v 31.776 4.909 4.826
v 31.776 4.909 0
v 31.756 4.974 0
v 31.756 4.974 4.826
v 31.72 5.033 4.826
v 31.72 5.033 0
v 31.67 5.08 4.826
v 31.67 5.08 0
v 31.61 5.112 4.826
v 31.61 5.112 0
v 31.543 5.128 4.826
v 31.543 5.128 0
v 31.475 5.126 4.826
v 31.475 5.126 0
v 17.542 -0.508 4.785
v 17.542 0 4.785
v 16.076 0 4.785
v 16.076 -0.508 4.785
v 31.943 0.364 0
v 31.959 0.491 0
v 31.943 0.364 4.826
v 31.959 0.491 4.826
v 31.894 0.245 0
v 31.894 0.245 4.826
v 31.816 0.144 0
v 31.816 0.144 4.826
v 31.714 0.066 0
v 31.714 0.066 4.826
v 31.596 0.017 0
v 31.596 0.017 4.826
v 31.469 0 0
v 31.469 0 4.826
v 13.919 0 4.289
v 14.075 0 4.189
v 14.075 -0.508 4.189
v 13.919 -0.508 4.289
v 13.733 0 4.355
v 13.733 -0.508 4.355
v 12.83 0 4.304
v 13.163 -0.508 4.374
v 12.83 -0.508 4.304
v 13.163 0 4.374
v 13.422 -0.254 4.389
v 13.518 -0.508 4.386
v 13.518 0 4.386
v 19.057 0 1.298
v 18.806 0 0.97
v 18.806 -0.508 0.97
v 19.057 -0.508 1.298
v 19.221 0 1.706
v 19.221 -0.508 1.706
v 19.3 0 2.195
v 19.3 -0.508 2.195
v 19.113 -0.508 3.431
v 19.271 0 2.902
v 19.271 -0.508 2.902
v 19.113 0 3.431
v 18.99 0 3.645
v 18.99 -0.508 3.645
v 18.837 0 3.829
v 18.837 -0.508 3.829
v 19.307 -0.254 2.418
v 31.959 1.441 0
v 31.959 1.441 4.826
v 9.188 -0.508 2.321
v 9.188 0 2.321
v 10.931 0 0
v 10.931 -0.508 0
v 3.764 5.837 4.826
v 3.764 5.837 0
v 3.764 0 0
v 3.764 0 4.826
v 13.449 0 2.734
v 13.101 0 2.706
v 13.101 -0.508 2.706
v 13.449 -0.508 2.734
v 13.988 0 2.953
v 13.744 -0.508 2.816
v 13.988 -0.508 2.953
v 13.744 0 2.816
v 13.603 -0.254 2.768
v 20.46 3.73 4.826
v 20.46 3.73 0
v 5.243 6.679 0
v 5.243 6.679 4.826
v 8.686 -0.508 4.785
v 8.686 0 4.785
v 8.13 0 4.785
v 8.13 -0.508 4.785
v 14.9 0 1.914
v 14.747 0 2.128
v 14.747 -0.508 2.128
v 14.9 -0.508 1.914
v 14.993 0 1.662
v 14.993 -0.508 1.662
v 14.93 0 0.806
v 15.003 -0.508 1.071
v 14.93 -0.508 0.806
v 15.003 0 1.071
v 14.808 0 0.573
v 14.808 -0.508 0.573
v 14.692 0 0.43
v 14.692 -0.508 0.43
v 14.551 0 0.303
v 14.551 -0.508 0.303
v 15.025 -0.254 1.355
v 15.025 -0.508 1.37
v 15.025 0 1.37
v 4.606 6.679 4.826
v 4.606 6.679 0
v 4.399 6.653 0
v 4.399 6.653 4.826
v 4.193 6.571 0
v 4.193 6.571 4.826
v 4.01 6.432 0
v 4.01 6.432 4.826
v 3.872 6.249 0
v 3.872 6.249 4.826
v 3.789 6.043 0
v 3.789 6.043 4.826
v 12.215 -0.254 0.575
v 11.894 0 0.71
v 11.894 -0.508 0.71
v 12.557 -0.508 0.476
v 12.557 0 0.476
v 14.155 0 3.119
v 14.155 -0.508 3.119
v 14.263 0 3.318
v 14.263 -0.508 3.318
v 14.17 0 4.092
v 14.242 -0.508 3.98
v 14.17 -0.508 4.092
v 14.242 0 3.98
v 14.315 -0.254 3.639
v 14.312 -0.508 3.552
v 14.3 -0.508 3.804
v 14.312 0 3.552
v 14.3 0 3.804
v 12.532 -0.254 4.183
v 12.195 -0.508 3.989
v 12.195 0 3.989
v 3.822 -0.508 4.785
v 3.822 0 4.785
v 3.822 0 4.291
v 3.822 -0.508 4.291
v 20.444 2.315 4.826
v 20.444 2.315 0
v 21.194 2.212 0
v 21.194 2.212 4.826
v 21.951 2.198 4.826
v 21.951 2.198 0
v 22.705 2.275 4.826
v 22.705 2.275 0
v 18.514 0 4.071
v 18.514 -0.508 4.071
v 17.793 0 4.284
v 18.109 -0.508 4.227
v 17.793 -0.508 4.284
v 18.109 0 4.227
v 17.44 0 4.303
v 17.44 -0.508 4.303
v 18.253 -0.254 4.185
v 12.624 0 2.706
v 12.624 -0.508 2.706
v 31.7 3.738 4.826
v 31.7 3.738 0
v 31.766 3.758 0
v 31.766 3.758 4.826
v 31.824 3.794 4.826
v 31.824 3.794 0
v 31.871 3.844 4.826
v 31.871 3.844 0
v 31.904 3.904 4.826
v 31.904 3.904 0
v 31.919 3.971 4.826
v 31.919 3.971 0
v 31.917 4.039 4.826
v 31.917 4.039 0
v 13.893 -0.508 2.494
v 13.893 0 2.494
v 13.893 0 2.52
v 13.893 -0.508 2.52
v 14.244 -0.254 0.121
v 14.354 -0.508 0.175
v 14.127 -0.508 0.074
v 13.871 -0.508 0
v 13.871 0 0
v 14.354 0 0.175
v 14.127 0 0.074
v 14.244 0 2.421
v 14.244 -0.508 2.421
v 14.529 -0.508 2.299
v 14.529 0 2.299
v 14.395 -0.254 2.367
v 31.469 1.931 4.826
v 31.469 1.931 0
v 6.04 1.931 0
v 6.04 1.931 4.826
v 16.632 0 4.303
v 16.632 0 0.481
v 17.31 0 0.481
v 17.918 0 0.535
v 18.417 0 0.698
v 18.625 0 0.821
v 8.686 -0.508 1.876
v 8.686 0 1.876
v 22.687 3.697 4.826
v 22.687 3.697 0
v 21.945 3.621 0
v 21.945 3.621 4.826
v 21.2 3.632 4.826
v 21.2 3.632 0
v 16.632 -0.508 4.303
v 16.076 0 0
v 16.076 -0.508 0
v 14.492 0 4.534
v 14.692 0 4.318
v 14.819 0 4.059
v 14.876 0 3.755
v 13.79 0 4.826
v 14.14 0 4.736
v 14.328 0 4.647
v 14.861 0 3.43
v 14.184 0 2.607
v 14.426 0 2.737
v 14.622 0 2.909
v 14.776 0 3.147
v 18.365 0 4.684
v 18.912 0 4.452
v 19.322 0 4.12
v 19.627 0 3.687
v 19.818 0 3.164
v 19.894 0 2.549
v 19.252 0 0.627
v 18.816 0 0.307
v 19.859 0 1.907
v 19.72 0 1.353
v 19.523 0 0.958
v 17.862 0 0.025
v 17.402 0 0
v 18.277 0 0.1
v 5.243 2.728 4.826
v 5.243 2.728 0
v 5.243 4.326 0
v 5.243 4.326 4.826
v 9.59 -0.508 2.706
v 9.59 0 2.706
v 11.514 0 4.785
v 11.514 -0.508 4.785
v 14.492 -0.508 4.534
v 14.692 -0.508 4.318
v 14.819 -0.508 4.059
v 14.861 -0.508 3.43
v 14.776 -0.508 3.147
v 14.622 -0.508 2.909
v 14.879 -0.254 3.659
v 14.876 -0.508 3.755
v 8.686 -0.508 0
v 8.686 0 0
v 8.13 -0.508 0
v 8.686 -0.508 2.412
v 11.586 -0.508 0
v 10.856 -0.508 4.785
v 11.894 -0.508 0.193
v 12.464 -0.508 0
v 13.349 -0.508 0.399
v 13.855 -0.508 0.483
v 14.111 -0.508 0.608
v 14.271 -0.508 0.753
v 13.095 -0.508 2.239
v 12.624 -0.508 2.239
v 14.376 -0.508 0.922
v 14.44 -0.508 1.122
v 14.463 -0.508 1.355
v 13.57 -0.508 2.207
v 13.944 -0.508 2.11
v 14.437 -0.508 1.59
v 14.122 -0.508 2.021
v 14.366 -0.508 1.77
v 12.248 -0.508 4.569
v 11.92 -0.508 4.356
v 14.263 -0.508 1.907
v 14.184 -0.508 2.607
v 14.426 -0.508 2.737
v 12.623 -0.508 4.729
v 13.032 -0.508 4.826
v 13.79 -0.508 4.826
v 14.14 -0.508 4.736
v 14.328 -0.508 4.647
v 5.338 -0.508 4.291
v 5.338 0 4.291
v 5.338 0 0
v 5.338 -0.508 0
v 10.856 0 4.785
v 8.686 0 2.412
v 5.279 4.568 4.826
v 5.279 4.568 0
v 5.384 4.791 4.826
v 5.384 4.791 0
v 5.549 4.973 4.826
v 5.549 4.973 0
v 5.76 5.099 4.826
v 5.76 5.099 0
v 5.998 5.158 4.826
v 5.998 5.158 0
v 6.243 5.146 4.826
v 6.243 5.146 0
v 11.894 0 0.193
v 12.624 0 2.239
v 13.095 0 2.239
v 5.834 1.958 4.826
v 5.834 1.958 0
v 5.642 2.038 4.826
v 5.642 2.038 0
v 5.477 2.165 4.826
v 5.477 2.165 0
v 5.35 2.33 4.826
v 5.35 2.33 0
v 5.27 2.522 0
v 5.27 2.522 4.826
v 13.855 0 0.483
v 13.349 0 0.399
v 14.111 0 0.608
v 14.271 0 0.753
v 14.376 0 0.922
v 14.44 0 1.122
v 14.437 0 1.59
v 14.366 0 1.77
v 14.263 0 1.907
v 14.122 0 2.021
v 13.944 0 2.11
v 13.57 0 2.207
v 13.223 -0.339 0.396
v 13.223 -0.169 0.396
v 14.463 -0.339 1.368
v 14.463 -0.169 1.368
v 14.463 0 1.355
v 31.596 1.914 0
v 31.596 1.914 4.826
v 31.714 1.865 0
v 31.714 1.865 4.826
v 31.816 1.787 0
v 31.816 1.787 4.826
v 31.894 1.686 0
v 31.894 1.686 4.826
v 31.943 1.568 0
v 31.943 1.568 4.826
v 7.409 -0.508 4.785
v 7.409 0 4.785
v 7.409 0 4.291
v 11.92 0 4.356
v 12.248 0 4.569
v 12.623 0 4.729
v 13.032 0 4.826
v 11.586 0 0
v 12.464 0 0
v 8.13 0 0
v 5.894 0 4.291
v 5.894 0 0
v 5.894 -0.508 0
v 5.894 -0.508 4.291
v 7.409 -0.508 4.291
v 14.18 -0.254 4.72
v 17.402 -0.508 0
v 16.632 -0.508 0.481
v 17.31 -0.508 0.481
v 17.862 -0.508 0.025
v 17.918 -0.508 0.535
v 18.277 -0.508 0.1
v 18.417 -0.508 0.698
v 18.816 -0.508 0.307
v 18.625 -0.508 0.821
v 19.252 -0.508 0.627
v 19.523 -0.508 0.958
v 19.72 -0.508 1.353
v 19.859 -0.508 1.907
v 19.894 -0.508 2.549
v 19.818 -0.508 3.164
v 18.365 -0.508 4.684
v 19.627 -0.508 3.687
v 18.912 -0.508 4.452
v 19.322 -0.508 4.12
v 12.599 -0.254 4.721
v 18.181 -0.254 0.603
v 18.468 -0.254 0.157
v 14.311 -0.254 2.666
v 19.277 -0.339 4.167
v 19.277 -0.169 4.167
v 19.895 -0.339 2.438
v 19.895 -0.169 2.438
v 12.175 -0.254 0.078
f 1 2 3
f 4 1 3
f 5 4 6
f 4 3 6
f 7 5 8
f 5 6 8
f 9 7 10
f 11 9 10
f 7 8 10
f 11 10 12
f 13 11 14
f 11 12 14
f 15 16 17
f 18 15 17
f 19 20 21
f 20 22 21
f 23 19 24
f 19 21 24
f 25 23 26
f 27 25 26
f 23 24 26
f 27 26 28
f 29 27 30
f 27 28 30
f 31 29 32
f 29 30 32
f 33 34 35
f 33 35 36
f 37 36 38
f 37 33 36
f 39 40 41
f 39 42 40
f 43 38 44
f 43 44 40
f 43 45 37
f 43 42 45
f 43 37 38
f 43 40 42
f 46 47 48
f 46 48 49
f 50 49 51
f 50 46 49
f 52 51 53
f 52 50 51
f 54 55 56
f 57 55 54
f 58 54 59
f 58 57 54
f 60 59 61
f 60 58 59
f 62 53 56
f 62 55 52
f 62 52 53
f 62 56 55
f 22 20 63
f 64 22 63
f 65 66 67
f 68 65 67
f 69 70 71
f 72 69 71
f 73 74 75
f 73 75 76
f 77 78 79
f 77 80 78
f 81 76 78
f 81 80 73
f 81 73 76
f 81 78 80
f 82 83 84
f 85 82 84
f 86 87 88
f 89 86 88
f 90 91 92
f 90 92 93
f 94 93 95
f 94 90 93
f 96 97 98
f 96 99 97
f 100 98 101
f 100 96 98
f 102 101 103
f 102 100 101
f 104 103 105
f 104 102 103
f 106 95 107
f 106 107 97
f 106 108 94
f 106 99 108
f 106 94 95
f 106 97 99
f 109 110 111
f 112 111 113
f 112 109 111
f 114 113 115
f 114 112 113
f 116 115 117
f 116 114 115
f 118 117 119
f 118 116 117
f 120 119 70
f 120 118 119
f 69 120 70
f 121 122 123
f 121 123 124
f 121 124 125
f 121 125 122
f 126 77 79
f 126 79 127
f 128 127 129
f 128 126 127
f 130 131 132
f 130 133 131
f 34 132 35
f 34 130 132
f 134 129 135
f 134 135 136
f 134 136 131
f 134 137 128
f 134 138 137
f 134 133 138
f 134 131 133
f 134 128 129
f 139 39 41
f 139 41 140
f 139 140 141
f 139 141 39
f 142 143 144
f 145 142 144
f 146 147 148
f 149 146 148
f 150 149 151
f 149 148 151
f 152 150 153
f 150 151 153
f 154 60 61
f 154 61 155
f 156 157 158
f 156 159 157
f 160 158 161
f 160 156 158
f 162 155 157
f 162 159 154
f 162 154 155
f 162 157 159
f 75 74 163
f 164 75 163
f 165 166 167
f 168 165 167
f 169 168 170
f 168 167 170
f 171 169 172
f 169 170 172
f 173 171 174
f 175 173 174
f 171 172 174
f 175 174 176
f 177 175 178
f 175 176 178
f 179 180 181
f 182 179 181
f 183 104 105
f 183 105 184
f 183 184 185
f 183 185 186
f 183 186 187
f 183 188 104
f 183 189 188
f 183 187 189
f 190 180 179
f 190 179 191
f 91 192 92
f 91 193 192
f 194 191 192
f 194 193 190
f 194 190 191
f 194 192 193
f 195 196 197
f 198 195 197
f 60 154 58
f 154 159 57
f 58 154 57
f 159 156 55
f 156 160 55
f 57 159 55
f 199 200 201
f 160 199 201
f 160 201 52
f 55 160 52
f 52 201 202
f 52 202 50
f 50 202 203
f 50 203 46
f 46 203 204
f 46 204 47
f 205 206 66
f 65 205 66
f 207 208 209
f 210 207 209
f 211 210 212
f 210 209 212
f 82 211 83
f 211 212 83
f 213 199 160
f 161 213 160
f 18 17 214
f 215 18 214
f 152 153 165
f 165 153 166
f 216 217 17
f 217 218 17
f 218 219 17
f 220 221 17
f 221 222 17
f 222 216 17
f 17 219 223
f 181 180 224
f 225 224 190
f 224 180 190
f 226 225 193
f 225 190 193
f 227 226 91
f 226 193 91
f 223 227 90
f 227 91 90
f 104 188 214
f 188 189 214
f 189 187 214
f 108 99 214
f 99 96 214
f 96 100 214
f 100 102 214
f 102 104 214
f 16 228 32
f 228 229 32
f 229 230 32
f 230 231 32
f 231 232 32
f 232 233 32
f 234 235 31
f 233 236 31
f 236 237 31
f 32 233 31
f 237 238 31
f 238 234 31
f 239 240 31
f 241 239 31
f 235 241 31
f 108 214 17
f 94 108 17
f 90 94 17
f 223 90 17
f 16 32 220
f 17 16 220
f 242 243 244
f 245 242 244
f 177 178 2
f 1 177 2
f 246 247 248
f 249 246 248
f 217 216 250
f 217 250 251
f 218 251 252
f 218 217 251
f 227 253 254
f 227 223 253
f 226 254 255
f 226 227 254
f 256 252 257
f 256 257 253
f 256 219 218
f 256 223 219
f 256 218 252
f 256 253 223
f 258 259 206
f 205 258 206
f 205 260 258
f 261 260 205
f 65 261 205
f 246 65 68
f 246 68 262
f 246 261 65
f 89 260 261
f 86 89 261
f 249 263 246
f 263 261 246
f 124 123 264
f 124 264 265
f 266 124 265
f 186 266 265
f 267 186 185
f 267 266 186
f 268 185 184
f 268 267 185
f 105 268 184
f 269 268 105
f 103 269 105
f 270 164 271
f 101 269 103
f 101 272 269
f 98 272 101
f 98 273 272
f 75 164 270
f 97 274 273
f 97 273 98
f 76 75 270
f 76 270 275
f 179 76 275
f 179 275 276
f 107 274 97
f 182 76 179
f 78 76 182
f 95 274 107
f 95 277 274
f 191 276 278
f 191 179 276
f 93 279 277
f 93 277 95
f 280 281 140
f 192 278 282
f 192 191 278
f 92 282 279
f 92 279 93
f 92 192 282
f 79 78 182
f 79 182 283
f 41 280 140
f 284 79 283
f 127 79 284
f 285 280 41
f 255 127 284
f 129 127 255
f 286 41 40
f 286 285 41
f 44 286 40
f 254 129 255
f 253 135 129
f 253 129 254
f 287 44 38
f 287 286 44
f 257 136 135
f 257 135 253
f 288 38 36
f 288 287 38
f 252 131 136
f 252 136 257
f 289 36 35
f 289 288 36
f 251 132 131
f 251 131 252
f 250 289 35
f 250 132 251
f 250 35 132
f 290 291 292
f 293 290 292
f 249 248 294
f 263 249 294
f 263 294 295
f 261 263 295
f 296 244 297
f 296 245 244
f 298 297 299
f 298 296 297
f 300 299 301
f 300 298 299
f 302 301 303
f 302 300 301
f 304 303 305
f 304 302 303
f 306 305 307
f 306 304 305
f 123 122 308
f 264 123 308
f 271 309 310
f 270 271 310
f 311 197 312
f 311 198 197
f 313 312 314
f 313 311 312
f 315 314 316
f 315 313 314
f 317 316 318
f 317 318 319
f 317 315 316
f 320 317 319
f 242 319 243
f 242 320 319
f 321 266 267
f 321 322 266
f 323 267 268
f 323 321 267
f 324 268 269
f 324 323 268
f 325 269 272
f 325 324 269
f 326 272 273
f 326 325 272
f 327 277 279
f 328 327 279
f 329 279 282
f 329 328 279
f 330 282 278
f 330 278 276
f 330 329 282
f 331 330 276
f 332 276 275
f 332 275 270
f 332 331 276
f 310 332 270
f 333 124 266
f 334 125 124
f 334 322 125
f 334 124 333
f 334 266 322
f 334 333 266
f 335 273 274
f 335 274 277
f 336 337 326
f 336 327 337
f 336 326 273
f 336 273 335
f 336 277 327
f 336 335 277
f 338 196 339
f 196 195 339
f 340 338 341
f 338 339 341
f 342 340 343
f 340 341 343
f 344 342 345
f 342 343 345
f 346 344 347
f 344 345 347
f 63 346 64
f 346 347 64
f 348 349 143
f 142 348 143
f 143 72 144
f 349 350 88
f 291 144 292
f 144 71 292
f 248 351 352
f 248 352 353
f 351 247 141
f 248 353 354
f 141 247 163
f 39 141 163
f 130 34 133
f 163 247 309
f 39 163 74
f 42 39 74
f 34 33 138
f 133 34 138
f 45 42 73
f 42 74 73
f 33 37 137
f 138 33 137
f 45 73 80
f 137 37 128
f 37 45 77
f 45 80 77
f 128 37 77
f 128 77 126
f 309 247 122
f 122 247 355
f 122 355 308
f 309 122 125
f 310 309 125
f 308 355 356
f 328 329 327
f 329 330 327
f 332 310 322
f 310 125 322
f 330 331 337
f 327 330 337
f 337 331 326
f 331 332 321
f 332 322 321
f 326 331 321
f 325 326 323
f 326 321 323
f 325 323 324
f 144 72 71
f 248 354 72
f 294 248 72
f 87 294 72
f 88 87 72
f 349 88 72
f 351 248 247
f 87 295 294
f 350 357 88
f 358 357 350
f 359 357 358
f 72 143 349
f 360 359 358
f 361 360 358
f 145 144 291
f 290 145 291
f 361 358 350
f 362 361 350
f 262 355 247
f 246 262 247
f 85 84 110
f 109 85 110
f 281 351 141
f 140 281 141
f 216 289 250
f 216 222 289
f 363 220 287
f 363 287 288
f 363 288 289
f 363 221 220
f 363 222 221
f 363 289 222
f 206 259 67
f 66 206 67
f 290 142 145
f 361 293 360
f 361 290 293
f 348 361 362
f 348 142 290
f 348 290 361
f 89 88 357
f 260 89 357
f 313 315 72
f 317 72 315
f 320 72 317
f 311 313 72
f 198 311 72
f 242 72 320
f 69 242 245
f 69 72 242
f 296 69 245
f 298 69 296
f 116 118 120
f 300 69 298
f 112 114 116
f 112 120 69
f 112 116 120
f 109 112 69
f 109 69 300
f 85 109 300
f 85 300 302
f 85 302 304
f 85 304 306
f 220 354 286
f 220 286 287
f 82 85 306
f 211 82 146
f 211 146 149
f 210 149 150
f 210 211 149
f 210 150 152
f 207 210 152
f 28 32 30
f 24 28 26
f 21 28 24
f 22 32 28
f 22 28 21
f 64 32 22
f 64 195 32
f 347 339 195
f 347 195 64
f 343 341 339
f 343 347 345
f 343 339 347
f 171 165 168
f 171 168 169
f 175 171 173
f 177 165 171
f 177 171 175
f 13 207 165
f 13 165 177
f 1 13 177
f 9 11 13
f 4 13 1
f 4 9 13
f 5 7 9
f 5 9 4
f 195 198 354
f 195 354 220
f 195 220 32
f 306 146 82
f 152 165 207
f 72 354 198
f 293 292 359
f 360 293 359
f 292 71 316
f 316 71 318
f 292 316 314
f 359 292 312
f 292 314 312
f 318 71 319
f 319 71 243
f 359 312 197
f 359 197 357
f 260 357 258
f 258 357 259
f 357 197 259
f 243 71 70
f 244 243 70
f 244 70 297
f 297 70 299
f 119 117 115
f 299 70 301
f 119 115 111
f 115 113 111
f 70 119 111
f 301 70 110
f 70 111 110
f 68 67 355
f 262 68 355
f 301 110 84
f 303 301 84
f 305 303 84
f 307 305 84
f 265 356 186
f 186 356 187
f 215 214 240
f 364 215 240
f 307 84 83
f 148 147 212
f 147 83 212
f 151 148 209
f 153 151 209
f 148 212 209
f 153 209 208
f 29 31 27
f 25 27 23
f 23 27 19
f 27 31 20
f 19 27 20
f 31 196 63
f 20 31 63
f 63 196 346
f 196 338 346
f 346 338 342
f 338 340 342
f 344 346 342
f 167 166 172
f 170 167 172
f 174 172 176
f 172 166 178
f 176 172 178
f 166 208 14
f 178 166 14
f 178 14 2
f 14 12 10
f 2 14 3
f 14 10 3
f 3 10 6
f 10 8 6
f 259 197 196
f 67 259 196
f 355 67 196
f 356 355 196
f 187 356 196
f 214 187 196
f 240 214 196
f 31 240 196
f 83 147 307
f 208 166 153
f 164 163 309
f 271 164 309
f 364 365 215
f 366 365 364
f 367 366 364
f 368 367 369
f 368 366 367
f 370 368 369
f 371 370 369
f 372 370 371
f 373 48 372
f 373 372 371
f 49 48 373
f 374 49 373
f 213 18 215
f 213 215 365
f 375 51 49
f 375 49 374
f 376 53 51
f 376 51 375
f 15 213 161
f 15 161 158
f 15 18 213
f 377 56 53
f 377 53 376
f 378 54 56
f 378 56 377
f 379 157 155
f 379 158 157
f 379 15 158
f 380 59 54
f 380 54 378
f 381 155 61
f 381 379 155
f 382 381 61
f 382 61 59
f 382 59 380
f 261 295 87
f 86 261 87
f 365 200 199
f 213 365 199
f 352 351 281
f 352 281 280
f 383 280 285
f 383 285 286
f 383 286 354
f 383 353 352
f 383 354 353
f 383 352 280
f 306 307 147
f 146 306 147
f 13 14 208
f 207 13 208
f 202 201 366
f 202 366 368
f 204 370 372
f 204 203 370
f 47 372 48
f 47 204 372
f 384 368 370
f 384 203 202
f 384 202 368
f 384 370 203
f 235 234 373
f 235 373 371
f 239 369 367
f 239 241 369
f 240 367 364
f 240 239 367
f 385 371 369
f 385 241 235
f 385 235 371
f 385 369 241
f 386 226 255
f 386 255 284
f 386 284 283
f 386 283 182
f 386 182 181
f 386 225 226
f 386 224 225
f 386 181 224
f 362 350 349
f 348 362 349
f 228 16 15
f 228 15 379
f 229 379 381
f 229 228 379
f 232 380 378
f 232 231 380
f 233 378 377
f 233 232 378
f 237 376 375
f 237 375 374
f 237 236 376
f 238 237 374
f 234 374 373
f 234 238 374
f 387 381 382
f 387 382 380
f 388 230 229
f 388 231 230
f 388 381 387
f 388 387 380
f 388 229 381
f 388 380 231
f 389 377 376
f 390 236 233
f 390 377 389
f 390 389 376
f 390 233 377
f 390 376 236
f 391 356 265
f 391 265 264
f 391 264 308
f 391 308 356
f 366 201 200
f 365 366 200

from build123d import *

# Parameters (mm, degrees)
F1_DEPTH = 4.826
F2_R     = 0.8421318362
F3_R     = 0.8368220374
F4_R     = 0.4905681959
F5_R     = 0.7971733183
F7_DEPTH = 0.508
F8_R     = 0.4905681959


with BuildPart() as f1:
    # F0 (on Top) → F1 (new body)
    with BuildSketch(Plane.XY):
        Polygon((3.7636798806, 1.93111517), (3.7636798806, 0), (31.9592878222, 0), (31.9592878222, 1.93111517), (5.2430788055, 1.93111517), align=None)
        with BuildLine():
            Line((3.7636798806, 6.3693127595), (3.7636798806, 1.93111517))
            Line((3.7636798806, 1.93111517), (5.2430788055, 1.93111517))
            Line((5.2430788055, 1.93111517), (5.2430788055, 5.3456245812))
            Line((5.2430788055, 5.3456245812), (20.4440524117, 2.3154419081))
            ThreePointArc((20.4440524117, 2.3154419081), (21.572559685, 2.1939202222), (22.7046736444, 2.2752477642))
            Line((22.7046736444, 2.2752477642), (31.7002432299, 3.7380780613))
            ThreePointArc((31.7002432299, 3.7380780613), (31.8710772939, 3.8437373318), (31.9171628323, 4.0392476436))
            Line((31.9171628323, 4.0392476436), (31.7757464521, 4.9088774915))
            ThreePointArc((31.7757464521, 4.9088774915), (31.6700871816, 5.0797115555), (31.4745768698, 5.1257970939))
            Line((31.4745768698, 5.1257970939), (22.6872542576, 3.696831243))
            ThreePointArc((22.6872542576, 3.696831243), (21.5722351198, 3.6152227731), (20.4601853424, 3.7304309004))
            Line((20.4601853424, 3.7304309004), (5.2430788055, 6.6787209362))
            Line((5.2430788055, 6.6787209362), (3.7601878867, 6.6787209362))
            Line((3.7601878867, 6.6787209362), (3.7636798806, 6.3693127595))
        make_face()
    extrude(amount=F1_DEPTH)

    # F2
    f2_edges = [f1.edges().sort_by_distance(p)[0] for p in [
        (3.760188, 6.678721, 2.413),
    ]]
    fillet(f2_edges, radius=F2_R)

    # F3
    f3_edges = [f1.edges().sort_by_distance(p)[0] for p in [
        (5.243079, 5.345625, 2.413),
    ]]
    fillet(f3_edges, radius=F3_R)

    # F4
    f4_edges = [f1.edges().sort_by_distance(p)[0] for p in [
        (31.959288, 1.931115, 2.413),
    ]]
    fillet(f4_edges, radius=F4_R)

    # F5
    f5_edges = [f1.edges().sort_by_distance(p)[0] for p in [
        (5.243079, 1.931115, 2.413),
    ]]
    fillet(f5_edges, radius=F5_R)

    # F6 (on face) → F7 (join)
    with BuildSketch(Plane.XZ):
        Polygon((5.3377853494, 0), (5.8939064431, 0), (5.8939064431, 4.2908250868), (7.4093626063, 4.2908250868), (7.4093626063, 4.7851549479), (3.8223291862, 4.7851549479), (3.8223291862, 4.2908250868), (5.3377853494, 4.2908250868), align=None)
        Polygon((8.1299112175, 4.7851549479), (8.1299112175, 0), (8.6860323112, 0), (8.6860323112, 1.8757304688), (9.1876933355, 2.3208368056), (10.9314628668, 0), (11.5860310091, 0), (9.5898600022, 2.7062465278), (11.5137666862, 4.7851549479), (10.8560566168, 4.7851549479), (8.6860323112, 2.411952691), (8.6860323112, 4.7851549479), align=None)
        with BuildLine():
            Line((13.789949635, 4.826), (13.0315141767, 4.826))
            add(Edge.make_bspline(
                [(12.598778839, 4.7207454427), (12.8088874261, 4.7931670674), (13.0315141767, 4.826)],
                knots=[0, 0, 0, 0.5466418669, 0.5466418669, 0.5466418669], degree=2))
            add(Edge.make_bspline(
                [(11.920122589, 4.3557582465), (12.2144164258, 4.5882608507), (12.598778839, 4.7207454427)],
                knots=[0, 0, 0, 1, 1, 1], degree=2))
            Line((11.920122589, 4.3557582465), (12.1945175543, 3.9892000868))
            add(Edge.make_bspline(
                [(12.8297104796, 4.3039164497), (12.5516499327, 4.2185607639), (12.1945175543, 3.9892000868)],
                knots=[0, 0, 0, 1, 1, 1], degree=2))
            add(Edge.make_bspline(
                [(13.4219637348, 4.3892721354), (13.1077710265, 4.3892721354), (12.8297104796, 4.3039164497)],
                knots=[0, 0, 0, 1, 1, 1], degree=2))
            add(Edge.make_bspline(
                [(14.0749609136, 4.1892361111), (13.8346034918, 4.3892721354), (13.4219637348, 4.3892721354)],
                knots=[0, 0, 0, 1, 1, 1], degree=2))
            add(Edge.make_bspline(
                [(14.3153183355, 3.6393988715), (14.3153183355, 3.9892000868), (14.0749609136, 4.1892361111)],
                knots=[0, 0, 0, 1, 1, 1], degree=2))
            add(Edge.make_bspline(
                [(13.9880342643, 2.9534114583), (14.3153183355, 3.2005763889), (14.3153183355, 3.6393988715)],
                knots=[0, 0, 0, 1, 1, 1], degree=2))
            add(Edge.make_bspline(
                [(13.1014871723, 2.7062465278), (13.6607501931, 2.7062465278), (13.9880342643, 2.9534114583)],
                knots=[0, 0, 0, 1, 1, 1], degree=2))
            Line((13.1014871723, 2.7062465278), (12.6239142556, 2.7062465278))
            Line((12.6239142556, 2.7062465278), (12.6239142556, 2.2391467014))
            Line((12.6239142556, 2.2391467014), (13.0952033181, 2.2391467014))
            add(Edge.make_bspline(
                [(14.4629889084, 1.3677855903), (14.4629889084, 2.2391467014), (13.0952033181, 2.2391467014)],
                knots=[0, 0, 0, 1, 1, 1], degree=2))
            add(Edge.make_bspline(
                [(13.2229750195, 0.3958828125), (14.4629889084, 0.3958828125), (14.4629889084, 1.3677855903)],
                knots=[0, 0, 0, 1, 1, 1], degree=2))
            add(Edge.make_bspline(
                [(12.5568864779, 0.4760019531), (12.9087823112, 0.3958828125), (13.2229750195, 0.3958828125)],
                knots=[0, 0, 0, 1, 1, 1], degree=2))
            add(Edge.make_bspline(
                [(11.8939398633, 0.7100755208), (12.2049906445, 0.5561210938), (12.5568864779, 0.4760019531)],
                knots=[0, 0, 0, 1, 1, 1], degree=2))
            Line((11.8939398633, 0.7100755208), (11.8939398633, 0.1927048611))
            add(Edge.make_bspline(
                [(12.4635495715, 0), (12.1708045154, 0.0591469127), (11.8939398633, 0.1927048611)],
                knots=[0.0691615274, 0.0691615274, 0.0691615274, 1, 1, 1], degree=2))
            Line((12.4635495715, 0), (13.8707030072, 0))
            add(Edge.make_bspline(
                [(14.5509628668, 0.302672309), (14.277243255, 0.0899806901), (13.8707030072, 0)],
                knots=[0, 0, 0, 0.5769429439, 0.5769429439, 0.5769429439], degree=2))
            add(Edge.make_bspline(
                [(15.0253938563, 1.3552178819), (15.0253938563, 0.6713250868), (14.5509628668, 0.302672309)],
                knots=[0, 0, 0, 1, 1, 1], degree=2))
            add(Edge.make_bspline(
                [(14.7473333095, 2.1276082899), (15.0253938563, 1.8327907986), (15.0253938563, 1.3552178819)],
                knots=[0, 0, 0, 1, 1, 1], degree=2))
            add(Edge.make_bspline(
                [(13.8932527973, 2.4936427951), (14.4692727626, 2.4224257813), (14.7473333095, 2.1276082899)],
                knots=[0, 0, 0, 1, 1, 1], degree=2))
            Line((13.8932527973, 2.4936427951), (13.8932527973, 2.5198255208))
            add(Edge.make_bspline(
                [(14.6216562261, 2.9094244792), (14.3645418598, 2.6182725694), (13.8932527973, 2.5198255208)],
                knots=[0, 0, 0, 1, 1, 1], degree=2))
            add(Edge.make_bspline(
                [(14.8787705925, 3.6592977431), (14.8787705925, 3.2005763889), (14.6216562261, 2.9094244792)],
                knots=[0, 0, 0, 1, 1, 1], degree=2))
            add(Edge.make_bspline(
                [(14.4923135612, 4.5343244358), (14.8787705925, 4.2154188368), (14.8787705925, 3.6592977431)],
                knots=[0, 0, 0, 1, 1, 1], degree=2))
            add(Edge.make_bspline(
                [(13.789949635, 4.826), (14.2187826063, 4.7600430693), (14.4923135612, 4.5343244358)],
                knots=[0.2922086215, 0.2922086215, 0.2922086215, 1, 1, 1], degree=2))
        make_face()
        with BuildLine():
            Line((16.0758448112, 4.7851549479), (16.0758448112, 0))
            Line((16.0758448112, 0), (17.4017380404, 0))
            add(Edge.make_bspline(
                [(19.2523330925, 0.6268144531), (18.6092853494, 0), (17.4017380404, 0)],
                knots=[0, 0, 0, 1, 1, 1], degree=2))
            add(Edge.make_bspline(
                [(19.8953808355, 2.4381354167), (19.8953808355, 1.2536289063), (19.2523330925, 0.6268144531)],
                knots=[0, 0, 0, 1, 1, 1], degree=2))
            add(Edge.make_bspline(
                [(19.2769448546, 4.166718967), (19.8953808355, 3.5482829861), (19.8953808355, 2.4381354167)],
                knots=[0, 0, 0, 1, 1, 1], degree=2))
            add(Edge.make_bspline(
                [(17.5420774501, 4.7851549479), (18.6585088737, 4.7851549479), (19.2769448546, 4.166718967)],
                knots=[0, 0, 0, 1, 1, 1], degree=2))
            Line((17.5420774501, 4.7851549479), (16.0758448112, 4.7851549479))
        make_face()
        with BuildLine():
            add(Edge.make_bspline(
                [(19.3067931619, 2.4182365451), (19.3067931619, 3.354530816), (18.8370750629, 3.8289618056)],
                knots=[0, 0, 0, 1, 1, 1], degree=2))
            add(Edge.make_bspline(
                [(18.8056557921, 0.9703318142), (19.3067931619, 1.4599487847), (19.3067931619, 2.4182365451)],
                knots=[0, 0, 0, 1, 1, 1], degree=2))
            add(Edge.make_bspline(
                [(17.3095748459, 0.4807148438), (18.3045184223, 0.4807148438), (18.8056557921, 0.9703318142)],
                knots=[0, 0, 0, 1, 1, 1], degree=2))
            Line((17.3095748459, 0.4807148438), (16.631965905, 0.4807148438))
            Line((16.631965905, 0.4807148437), (16.631965905, 4.3033927951))
            Line((16.631965905, 4.3033927951), (17.4404884744, 4.3033927951))
            add(Edge.make_bspline(
                [(18.8370750629, 3.8289618056), (18.367356964, 4.3033927951), (17.4404884744, 4.3033927951)],
                knots=[0, 0, 0, 1, 1, 1], degree=2))
        make_face(mode=Mode.SUBTRACT)
    extrude(amount=F7_DEPTH)

    # F8
    f8_edges = [f1.edges().sort_by_distance(p)[0] for p in [
        (31.959288, 0, 2.413),
    ]]
    fillet(f8_edges, radius=F8_R)


solid = f1.part
